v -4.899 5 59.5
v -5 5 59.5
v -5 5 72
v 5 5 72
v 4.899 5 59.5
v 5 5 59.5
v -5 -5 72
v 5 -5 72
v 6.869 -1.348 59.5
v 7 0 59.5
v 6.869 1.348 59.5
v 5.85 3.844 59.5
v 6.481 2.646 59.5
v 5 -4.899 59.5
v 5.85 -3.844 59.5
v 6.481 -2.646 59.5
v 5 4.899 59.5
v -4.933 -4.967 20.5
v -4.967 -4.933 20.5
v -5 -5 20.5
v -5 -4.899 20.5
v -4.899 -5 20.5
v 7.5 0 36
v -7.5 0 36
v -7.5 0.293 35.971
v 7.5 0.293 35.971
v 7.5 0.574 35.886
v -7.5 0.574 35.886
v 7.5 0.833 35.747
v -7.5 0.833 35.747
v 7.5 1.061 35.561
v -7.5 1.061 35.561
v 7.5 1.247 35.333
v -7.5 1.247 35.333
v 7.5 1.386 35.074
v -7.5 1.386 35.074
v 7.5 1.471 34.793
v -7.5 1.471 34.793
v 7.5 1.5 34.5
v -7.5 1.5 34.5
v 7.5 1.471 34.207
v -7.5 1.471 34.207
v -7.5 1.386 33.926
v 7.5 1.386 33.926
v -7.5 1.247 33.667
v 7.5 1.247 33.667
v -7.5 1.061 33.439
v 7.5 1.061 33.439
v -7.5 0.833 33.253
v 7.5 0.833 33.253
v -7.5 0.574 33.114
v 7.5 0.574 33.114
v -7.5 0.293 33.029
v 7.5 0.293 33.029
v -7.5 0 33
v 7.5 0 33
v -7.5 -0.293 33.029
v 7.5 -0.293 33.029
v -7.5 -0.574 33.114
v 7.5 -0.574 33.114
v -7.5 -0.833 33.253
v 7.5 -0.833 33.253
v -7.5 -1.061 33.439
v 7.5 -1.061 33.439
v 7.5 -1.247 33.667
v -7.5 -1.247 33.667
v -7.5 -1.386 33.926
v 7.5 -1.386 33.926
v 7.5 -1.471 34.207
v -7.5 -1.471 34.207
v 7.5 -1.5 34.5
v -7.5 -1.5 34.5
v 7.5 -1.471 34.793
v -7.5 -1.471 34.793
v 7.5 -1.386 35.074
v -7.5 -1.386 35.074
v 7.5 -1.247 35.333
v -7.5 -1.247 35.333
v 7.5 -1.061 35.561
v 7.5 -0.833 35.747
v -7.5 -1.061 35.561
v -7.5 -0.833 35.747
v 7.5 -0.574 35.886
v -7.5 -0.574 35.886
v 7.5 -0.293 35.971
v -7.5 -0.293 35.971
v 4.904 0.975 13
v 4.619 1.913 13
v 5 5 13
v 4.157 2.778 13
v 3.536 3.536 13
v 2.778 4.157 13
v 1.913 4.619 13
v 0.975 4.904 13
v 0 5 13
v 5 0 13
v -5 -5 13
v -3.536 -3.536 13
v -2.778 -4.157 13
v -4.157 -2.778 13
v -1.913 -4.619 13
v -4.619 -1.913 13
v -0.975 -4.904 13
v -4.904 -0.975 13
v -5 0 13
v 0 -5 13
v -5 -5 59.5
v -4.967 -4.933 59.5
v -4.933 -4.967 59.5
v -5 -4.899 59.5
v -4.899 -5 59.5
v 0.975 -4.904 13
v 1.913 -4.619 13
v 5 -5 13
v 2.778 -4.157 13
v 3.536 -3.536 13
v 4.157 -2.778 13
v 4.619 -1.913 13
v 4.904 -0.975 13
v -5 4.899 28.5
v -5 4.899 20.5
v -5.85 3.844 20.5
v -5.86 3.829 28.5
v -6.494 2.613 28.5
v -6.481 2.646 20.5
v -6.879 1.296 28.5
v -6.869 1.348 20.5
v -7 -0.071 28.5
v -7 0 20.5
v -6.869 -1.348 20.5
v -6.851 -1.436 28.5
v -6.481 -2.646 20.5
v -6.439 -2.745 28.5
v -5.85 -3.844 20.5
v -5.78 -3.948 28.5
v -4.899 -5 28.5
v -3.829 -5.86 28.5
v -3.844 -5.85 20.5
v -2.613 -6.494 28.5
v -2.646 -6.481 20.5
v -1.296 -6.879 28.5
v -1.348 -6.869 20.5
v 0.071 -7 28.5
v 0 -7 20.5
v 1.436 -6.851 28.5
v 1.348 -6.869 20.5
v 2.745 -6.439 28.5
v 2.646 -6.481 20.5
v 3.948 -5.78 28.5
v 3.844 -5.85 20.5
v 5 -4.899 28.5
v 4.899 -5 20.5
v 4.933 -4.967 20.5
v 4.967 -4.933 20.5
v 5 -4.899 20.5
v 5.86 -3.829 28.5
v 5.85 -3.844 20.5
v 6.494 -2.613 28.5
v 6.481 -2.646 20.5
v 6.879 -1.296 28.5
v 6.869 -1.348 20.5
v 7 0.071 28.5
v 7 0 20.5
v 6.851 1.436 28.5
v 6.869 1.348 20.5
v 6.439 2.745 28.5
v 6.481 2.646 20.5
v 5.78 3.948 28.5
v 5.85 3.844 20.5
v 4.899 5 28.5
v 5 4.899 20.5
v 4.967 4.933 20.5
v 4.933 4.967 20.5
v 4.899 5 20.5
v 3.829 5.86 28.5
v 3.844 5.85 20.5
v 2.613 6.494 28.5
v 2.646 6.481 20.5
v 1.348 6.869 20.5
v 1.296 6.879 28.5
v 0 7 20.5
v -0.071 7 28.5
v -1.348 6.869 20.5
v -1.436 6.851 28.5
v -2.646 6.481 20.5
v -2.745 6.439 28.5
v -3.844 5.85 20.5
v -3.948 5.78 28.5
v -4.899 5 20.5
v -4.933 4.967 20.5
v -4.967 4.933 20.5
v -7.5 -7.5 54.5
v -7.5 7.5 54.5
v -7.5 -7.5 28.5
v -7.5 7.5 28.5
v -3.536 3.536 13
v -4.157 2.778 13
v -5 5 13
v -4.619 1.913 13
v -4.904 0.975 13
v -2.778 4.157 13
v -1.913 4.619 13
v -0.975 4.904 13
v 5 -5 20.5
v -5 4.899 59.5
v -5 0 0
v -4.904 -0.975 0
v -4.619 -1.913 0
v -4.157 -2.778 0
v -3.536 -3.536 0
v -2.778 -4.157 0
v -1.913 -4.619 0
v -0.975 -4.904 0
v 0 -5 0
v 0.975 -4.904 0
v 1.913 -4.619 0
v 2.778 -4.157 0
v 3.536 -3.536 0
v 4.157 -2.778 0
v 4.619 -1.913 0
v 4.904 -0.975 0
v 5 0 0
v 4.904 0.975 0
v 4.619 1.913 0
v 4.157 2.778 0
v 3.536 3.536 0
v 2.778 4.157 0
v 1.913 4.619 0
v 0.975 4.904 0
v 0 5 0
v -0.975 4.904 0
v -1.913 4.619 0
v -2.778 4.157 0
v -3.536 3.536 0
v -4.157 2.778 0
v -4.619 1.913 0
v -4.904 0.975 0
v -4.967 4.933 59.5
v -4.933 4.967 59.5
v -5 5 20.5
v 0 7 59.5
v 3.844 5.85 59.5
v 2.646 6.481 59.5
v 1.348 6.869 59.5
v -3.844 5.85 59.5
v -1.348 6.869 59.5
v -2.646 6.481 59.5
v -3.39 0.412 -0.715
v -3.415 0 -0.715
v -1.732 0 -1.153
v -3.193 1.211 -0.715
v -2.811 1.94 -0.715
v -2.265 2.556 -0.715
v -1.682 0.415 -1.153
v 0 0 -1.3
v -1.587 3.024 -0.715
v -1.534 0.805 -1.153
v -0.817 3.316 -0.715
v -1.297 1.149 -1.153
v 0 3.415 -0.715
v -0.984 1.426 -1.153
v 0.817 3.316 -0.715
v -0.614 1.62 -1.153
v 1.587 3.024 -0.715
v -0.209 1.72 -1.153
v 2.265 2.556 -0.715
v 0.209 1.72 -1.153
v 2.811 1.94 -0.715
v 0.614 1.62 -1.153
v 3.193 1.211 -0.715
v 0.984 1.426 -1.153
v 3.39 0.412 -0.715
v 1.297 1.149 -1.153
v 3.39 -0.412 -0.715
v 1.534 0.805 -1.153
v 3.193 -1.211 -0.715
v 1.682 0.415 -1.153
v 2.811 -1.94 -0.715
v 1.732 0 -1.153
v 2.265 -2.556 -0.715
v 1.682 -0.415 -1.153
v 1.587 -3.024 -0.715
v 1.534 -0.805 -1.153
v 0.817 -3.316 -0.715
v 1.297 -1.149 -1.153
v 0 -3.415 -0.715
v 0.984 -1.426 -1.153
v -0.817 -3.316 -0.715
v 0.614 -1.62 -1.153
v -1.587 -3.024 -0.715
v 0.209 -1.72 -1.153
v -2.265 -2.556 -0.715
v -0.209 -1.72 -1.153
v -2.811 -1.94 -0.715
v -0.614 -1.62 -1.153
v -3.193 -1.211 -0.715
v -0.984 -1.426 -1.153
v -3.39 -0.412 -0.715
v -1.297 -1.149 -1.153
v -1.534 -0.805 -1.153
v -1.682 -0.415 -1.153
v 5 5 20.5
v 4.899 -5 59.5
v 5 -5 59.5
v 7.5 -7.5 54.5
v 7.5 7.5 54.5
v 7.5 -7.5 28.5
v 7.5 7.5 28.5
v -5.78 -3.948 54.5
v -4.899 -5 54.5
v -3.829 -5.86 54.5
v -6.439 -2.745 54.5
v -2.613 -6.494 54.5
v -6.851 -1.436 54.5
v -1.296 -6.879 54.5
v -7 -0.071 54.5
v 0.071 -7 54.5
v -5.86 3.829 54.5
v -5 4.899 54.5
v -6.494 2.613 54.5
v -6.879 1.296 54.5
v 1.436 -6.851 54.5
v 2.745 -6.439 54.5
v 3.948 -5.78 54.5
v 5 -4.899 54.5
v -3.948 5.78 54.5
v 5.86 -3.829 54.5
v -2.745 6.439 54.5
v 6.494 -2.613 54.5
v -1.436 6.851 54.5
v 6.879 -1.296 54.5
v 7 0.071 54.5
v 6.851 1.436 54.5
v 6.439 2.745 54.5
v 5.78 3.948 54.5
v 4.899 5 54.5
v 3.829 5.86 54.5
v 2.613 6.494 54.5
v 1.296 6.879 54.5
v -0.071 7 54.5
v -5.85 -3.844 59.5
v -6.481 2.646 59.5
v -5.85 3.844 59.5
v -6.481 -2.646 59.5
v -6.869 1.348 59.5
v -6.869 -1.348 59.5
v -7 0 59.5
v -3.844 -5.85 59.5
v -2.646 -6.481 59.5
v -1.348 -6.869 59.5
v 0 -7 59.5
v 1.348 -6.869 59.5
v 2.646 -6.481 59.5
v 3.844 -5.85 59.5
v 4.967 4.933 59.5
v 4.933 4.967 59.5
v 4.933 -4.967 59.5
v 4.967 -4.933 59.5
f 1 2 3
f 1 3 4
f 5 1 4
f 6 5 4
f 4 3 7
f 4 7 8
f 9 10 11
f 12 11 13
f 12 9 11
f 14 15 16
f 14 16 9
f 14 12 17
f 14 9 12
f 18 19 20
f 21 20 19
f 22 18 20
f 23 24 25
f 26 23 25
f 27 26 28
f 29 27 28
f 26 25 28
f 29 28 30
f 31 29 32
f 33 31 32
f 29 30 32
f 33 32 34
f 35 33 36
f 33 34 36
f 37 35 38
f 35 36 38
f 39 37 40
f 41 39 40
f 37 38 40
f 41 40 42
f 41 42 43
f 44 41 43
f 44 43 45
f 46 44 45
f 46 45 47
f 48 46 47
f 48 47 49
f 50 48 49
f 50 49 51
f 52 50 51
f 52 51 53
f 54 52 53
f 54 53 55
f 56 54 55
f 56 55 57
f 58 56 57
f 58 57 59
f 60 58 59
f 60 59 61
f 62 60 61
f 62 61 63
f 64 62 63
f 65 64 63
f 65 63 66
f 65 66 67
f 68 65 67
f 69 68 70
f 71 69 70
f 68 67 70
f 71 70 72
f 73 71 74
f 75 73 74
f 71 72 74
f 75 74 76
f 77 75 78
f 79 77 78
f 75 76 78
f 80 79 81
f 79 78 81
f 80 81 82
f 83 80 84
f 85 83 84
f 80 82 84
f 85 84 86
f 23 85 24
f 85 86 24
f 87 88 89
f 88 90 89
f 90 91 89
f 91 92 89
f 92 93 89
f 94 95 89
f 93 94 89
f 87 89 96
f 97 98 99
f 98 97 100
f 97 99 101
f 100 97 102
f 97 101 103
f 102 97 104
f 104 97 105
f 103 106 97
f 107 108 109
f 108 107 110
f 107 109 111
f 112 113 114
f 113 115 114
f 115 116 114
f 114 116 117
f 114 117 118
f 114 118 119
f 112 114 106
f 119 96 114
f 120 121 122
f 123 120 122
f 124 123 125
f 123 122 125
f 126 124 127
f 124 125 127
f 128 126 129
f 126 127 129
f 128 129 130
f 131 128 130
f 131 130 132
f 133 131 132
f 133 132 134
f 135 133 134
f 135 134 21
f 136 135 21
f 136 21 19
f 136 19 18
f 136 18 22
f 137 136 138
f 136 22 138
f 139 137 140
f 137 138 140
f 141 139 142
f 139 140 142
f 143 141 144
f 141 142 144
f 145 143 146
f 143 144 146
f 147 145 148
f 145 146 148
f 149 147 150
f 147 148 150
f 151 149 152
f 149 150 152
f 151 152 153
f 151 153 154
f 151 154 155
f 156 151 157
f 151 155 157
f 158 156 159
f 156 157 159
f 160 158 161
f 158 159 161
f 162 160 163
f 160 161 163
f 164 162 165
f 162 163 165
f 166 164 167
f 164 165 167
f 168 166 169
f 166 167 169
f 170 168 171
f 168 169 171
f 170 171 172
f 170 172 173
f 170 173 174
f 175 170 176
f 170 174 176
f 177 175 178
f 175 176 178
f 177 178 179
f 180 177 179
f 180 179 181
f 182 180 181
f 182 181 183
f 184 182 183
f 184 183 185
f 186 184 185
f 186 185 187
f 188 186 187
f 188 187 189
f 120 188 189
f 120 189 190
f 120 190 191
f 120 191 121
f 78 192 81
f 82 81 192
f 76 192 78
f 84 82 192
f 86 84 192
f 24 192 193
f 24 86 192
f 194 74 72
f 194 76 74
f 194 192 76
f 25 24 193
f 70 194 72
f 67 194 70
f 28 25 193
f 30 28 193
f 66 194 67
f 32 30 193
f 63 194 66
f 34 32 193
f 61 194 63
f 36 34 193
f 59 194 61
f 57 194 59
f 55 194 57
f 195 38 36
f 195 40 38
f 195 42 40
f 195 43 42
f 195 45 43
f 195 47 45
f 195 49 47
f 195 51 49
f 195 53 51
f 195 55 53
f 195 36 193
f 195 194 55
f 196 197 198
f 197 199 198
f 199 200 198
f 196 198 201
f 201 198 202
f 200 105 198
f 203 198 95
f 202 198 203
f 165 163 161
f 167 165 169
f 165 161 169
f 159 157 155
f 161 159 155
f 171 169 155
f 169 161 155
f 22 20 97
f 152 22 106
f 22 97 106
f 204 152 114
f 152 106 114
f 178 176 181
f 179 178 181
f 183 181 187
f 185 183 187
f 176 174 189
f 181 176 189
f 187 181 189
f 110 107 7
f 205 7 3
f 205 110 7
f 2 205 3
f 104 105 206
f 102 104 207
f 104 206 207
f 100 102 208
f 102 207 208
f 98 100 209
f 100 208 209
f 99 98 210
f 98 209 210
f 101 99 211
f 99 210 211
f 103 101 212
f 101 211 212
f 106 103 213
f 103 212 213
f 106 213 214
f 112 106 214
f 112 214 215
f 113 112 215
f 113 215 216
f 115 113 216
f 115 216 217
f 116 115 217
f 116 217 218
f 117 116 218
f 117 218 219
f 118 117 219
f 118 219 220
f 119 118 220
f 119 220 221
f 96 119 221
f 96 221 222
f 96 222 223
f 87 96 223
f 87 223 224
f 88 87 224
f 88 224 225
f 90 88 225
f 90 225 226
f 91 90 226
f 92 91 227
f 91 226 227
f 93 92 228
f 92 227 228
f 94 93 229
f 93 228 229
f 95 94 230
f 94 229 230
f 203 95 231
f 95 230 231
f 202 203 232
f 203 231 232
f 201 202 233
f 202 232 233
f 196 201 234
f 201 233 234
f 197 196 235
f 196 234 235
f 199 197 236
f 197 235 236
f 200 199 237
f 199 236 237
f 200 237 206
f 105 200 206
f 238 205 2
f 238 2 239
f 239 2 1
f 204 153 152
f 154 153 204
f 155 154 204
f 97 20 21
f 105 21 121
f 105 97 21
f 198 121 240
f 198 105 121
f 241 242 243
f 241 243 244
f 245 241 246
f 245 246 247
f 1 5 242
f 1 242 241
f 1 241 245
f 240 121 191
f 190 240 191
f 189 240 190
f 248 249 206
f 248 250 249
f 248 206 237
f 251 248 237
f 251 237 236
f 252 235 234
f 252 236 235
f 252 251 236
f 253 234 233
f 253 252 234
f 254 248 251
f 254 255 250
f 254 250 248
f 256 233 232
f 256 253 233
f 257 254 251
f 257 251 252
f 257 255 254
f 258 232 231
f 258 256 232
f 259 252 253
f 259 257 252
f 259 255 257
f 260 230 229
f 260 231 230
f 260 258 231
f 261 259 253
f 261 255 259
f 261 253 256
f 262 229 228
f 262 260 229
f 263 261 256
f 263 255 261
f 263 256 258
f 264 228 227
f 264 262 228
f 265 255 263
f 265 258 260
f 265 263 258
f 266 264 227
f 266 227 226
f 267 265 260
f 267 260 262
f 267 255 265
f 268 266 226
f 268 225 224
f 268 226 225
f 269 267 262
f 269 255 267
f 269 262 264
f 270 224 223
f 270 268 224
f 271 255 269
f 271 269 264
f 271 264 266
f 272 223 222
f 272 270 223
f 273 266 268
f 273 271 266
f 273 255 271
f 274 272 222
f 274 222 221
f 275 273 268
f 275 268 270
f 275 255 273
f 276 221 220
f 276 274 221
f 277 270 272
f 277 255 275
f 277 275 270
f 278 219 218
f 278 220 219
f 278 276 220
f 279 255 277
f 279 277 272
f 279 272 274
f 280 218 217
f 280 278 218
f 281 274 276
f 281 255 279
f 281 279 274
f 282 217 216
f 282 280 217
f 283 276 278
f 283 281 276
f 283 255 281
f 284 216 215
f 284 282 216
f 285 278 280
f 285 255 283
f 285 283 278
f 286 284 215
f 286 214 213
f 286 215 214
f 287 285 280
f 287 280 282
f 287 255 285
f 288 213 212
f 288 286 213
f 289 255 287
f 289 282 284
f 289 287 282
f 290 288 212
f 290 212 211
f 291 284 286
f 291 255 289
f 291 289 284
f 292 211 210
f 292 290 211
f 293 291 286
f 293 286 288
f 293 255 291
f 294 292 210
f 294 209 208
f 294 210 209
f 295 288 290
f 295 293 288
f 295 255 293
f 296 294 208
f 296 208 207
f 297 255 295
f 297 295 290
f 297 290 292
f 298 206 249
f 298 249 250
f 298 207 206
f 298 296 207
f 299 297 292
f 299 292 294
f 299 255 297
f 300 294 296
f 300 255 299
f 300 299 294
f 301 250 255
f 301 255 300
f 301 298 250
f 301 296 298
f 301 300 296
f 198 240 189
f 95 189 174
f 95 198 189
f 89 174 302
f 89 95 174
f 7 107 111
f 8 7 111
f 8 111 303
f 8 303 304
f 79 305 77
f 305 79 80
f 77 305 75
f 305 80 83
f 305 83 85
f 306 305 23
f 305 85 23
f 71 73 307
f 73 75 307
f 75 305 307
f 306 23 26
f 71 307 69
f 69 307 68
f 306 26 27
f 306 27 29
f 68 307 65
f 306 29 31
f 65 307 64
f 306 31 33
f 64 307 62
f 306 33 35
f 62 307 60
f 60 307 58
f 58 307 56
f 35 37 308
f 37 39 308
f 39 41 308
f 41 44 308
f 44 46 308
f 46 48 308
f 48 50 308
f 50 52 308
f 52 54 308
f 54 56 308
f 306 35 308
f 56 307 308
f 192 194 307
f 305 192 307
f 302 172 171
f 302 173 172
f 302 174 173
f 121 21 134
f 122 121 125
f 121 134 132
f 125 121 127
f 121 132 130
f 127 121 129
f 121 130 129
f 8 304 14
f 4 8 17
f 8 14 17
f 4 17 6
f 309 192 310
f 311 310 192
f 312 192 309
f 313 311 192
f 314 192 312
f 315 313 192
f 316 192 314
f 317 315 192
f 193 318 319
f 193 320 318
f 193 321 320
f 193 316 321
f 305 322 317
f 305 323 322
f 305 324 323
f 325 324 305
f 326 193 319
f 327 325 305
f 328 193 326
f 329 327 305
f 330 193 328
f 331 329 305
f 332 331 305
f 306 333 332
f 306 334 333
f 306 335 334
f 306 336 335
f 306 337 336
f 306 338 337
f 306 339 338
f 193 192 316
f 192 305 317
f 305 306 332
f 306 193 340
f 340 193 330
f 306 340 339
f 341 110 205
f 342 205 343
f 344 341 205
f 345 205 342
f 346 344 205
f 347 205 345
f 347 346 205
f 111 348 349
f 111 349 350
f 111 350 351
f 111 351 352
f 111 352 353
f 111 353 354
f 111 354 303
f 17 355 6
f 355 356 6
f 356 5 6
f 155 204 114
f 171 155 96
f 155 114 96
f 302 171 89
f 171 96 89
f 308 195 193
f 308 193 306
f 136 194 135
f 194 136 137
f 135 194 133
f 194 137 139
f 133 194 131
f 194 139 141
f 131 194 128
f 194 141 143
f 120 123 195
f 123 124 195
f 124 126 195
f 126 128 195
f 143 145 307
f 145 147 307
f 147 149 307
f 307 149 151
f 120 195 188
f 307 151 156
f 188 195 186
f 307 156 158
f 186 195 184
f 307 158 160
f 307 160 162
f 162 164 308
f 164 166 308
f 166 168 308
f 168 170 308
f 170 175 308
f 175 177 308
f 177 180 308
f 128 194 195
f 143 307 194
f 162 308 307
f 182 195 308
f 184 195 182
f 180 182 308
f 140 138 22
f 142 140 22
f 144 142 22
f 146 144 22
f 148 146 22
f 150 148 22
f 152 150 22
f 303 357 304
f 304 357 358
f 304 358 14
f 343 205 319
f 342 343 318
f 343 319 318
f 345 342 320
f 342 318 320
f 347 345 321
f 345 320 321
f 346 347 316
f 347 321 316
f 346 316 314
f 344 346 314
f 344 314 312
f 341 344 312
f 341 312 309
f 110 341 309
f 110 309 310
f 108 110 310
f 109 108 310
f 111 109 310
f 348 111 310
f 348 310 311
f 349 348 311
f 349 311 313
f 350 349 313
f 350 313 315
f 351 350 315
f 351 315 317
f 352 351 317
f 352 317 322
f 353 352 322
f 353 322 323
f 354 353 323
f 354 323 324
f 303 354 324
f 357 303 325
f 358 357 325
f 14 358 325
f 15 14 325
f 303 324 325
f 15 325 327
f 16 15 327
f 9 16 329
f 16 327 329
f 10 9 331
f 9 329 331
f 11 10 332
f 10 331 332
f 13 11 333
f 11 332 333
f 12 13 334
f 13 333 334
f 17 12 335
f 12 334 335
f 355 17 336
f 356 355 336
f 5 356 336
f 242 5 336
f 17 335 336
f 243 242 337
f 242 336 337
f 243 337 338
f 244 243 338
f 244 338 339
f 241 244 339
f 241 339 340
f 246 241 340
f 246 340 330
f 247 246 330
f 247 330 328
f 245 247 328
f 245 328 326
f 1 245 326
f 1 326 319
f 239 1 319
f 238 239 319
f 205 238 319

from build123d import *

# Parameters (mm, degrees)
SCHIZZO1_R                   = 5
ESTRUSIONE_ESTRUSIONE1_DEPTH = 13
SCHIZZO2_W                   = 10
SCHIZZO2_H                   = 10
ESTRUSIONE_ESTRUSIONE2_DEPTH = 7.5
SCHIZZO3_R                   = 7
ESTRUSIONE_ESTRUSIONE3_DEPTH = 8
SCHIZZO4_W                   = 15
SCHIZZO4_H                   = 15
ESTRUSIONE_ESTRUSIONE4_DEPTH = 26
SCHIZZO5_R                   = 7
ESTRUSIONE_ESTRUSIONE5_DEPTH = 5
SCHIZZO6_W                   = 10
SCHIZZO6_H                   = 10
ESTRUSIONE_ESTRUSIONE6_DEPTH = 12.5
CUPOLA1_FACE_RADIUS          = 5
CUPOLA1_HEIGHT               = 1.3
SCHIZZO7_R                   = 1.5
TAGLIO_ESTRUSIONE1_DEPTH     = 74.927329182


with BuildPart() as part:
    # Schizzo1 → Estrusione-Estrusione1 (new body)
    with BuildSketch(Plane.XY):
        with Locations(Location((0, 0, 0), (0, 0, 180))):
            Circle(SCHIZZO1_R)
    extrude(amount=ESTRUSIONE_ESTRUSIONE1_DEPTH)

    # Schizzo2 → Estrusione-Estrusione2 (add)
    with BuildSketch(Plane.XY.offset(13)):
        Rectangle(SCHIZZO2_W, SCHIZZO2_H)
    extrude(amount=ESTRUSIONE_ESTRUSIONE2_DEPTH)

    # Schizzo3 → Estrusione-Estrusione3 (add)
    with BuildSketch(Plane.XY.offset(20.5)):
        with Locations(Location((0, 0, 0), (0, 0, 135.584691403))):
            Circle(SCHIZZO3_R)
    extrude(amount=ESTRUSIONE_ESTRUSIONE3_DEPTH)

    # Schizzo4 → Estrusione-Estrusione4 (add)
    with BuildSketch(Plane.XY.offset(28.5)):
        Rectangle(SCHIZZO4_W, SCHIZZO4_H)
    extrude(amount=ESTRUSIONE_ESTRUSIONE4_DEPTH)

    # Schizzo5 → Estrusione-Estrusione5 (add)
    with BuildSketch(Plane.XY.offset(54.5)):
        with Locations(Location((0, 0, 0), (0, 0, 135.584691403))):
            Circle(SCHIZZO5_R)
    extrude(amount=ESTRUSIONE_ESTRUSIONE5_DEPTH)

    # Schizzo6 → Estrusione-Estrusione6 (add)
    with BuildSketch(Plane.XY.offset(59.5)):
        Rectangle(SCHIZZO6_W, SCHIZZO6_H)
    extrude(amount=ESTRUSIONE_ESTRUSIONE6_DEPTH)

    # Cupola1: a dome of height H over a round flat face of radius A is a cap of a sphere of radius (A * A + H * H) / (2 * H)
    cupola1_r = (CUPOLA1_FACE_RADIUS * CUPOLA1_FACE_RADIUS + CUPOLA1_HEIGHT * CUPOLA1_HEIGHT) / (2 * CUPOLA1_HEIGHT)
    cupola1_base = Plane((0, 0, 0), z_dir=(0, 0, -1))
    with Locations(cupola1_base.offset(CUPOLA1_HEIGHT - cupola1_r)):
        cupola1_ball = Sphere(cupola1_r, mode=Mode.PRIVATE)
    add(split(cupola1_ball, bisect_by=cupola1_base, keep=Keep.TOP, mode=Mode.PRIVATE))

    # Schizzo7 → Taglio-Estrusione1 (cut, through all)
    with BuildSketch(Plane.ZY.offset(7.5)):
        with Locations((34.5, 0)):
            Circle(SCHIZZO7_R)
    extrude(amount=-TAGLIO_ESTRUSIONE1_DEPTH, mode=Mode.SUBTRACT)


solid = part.part
